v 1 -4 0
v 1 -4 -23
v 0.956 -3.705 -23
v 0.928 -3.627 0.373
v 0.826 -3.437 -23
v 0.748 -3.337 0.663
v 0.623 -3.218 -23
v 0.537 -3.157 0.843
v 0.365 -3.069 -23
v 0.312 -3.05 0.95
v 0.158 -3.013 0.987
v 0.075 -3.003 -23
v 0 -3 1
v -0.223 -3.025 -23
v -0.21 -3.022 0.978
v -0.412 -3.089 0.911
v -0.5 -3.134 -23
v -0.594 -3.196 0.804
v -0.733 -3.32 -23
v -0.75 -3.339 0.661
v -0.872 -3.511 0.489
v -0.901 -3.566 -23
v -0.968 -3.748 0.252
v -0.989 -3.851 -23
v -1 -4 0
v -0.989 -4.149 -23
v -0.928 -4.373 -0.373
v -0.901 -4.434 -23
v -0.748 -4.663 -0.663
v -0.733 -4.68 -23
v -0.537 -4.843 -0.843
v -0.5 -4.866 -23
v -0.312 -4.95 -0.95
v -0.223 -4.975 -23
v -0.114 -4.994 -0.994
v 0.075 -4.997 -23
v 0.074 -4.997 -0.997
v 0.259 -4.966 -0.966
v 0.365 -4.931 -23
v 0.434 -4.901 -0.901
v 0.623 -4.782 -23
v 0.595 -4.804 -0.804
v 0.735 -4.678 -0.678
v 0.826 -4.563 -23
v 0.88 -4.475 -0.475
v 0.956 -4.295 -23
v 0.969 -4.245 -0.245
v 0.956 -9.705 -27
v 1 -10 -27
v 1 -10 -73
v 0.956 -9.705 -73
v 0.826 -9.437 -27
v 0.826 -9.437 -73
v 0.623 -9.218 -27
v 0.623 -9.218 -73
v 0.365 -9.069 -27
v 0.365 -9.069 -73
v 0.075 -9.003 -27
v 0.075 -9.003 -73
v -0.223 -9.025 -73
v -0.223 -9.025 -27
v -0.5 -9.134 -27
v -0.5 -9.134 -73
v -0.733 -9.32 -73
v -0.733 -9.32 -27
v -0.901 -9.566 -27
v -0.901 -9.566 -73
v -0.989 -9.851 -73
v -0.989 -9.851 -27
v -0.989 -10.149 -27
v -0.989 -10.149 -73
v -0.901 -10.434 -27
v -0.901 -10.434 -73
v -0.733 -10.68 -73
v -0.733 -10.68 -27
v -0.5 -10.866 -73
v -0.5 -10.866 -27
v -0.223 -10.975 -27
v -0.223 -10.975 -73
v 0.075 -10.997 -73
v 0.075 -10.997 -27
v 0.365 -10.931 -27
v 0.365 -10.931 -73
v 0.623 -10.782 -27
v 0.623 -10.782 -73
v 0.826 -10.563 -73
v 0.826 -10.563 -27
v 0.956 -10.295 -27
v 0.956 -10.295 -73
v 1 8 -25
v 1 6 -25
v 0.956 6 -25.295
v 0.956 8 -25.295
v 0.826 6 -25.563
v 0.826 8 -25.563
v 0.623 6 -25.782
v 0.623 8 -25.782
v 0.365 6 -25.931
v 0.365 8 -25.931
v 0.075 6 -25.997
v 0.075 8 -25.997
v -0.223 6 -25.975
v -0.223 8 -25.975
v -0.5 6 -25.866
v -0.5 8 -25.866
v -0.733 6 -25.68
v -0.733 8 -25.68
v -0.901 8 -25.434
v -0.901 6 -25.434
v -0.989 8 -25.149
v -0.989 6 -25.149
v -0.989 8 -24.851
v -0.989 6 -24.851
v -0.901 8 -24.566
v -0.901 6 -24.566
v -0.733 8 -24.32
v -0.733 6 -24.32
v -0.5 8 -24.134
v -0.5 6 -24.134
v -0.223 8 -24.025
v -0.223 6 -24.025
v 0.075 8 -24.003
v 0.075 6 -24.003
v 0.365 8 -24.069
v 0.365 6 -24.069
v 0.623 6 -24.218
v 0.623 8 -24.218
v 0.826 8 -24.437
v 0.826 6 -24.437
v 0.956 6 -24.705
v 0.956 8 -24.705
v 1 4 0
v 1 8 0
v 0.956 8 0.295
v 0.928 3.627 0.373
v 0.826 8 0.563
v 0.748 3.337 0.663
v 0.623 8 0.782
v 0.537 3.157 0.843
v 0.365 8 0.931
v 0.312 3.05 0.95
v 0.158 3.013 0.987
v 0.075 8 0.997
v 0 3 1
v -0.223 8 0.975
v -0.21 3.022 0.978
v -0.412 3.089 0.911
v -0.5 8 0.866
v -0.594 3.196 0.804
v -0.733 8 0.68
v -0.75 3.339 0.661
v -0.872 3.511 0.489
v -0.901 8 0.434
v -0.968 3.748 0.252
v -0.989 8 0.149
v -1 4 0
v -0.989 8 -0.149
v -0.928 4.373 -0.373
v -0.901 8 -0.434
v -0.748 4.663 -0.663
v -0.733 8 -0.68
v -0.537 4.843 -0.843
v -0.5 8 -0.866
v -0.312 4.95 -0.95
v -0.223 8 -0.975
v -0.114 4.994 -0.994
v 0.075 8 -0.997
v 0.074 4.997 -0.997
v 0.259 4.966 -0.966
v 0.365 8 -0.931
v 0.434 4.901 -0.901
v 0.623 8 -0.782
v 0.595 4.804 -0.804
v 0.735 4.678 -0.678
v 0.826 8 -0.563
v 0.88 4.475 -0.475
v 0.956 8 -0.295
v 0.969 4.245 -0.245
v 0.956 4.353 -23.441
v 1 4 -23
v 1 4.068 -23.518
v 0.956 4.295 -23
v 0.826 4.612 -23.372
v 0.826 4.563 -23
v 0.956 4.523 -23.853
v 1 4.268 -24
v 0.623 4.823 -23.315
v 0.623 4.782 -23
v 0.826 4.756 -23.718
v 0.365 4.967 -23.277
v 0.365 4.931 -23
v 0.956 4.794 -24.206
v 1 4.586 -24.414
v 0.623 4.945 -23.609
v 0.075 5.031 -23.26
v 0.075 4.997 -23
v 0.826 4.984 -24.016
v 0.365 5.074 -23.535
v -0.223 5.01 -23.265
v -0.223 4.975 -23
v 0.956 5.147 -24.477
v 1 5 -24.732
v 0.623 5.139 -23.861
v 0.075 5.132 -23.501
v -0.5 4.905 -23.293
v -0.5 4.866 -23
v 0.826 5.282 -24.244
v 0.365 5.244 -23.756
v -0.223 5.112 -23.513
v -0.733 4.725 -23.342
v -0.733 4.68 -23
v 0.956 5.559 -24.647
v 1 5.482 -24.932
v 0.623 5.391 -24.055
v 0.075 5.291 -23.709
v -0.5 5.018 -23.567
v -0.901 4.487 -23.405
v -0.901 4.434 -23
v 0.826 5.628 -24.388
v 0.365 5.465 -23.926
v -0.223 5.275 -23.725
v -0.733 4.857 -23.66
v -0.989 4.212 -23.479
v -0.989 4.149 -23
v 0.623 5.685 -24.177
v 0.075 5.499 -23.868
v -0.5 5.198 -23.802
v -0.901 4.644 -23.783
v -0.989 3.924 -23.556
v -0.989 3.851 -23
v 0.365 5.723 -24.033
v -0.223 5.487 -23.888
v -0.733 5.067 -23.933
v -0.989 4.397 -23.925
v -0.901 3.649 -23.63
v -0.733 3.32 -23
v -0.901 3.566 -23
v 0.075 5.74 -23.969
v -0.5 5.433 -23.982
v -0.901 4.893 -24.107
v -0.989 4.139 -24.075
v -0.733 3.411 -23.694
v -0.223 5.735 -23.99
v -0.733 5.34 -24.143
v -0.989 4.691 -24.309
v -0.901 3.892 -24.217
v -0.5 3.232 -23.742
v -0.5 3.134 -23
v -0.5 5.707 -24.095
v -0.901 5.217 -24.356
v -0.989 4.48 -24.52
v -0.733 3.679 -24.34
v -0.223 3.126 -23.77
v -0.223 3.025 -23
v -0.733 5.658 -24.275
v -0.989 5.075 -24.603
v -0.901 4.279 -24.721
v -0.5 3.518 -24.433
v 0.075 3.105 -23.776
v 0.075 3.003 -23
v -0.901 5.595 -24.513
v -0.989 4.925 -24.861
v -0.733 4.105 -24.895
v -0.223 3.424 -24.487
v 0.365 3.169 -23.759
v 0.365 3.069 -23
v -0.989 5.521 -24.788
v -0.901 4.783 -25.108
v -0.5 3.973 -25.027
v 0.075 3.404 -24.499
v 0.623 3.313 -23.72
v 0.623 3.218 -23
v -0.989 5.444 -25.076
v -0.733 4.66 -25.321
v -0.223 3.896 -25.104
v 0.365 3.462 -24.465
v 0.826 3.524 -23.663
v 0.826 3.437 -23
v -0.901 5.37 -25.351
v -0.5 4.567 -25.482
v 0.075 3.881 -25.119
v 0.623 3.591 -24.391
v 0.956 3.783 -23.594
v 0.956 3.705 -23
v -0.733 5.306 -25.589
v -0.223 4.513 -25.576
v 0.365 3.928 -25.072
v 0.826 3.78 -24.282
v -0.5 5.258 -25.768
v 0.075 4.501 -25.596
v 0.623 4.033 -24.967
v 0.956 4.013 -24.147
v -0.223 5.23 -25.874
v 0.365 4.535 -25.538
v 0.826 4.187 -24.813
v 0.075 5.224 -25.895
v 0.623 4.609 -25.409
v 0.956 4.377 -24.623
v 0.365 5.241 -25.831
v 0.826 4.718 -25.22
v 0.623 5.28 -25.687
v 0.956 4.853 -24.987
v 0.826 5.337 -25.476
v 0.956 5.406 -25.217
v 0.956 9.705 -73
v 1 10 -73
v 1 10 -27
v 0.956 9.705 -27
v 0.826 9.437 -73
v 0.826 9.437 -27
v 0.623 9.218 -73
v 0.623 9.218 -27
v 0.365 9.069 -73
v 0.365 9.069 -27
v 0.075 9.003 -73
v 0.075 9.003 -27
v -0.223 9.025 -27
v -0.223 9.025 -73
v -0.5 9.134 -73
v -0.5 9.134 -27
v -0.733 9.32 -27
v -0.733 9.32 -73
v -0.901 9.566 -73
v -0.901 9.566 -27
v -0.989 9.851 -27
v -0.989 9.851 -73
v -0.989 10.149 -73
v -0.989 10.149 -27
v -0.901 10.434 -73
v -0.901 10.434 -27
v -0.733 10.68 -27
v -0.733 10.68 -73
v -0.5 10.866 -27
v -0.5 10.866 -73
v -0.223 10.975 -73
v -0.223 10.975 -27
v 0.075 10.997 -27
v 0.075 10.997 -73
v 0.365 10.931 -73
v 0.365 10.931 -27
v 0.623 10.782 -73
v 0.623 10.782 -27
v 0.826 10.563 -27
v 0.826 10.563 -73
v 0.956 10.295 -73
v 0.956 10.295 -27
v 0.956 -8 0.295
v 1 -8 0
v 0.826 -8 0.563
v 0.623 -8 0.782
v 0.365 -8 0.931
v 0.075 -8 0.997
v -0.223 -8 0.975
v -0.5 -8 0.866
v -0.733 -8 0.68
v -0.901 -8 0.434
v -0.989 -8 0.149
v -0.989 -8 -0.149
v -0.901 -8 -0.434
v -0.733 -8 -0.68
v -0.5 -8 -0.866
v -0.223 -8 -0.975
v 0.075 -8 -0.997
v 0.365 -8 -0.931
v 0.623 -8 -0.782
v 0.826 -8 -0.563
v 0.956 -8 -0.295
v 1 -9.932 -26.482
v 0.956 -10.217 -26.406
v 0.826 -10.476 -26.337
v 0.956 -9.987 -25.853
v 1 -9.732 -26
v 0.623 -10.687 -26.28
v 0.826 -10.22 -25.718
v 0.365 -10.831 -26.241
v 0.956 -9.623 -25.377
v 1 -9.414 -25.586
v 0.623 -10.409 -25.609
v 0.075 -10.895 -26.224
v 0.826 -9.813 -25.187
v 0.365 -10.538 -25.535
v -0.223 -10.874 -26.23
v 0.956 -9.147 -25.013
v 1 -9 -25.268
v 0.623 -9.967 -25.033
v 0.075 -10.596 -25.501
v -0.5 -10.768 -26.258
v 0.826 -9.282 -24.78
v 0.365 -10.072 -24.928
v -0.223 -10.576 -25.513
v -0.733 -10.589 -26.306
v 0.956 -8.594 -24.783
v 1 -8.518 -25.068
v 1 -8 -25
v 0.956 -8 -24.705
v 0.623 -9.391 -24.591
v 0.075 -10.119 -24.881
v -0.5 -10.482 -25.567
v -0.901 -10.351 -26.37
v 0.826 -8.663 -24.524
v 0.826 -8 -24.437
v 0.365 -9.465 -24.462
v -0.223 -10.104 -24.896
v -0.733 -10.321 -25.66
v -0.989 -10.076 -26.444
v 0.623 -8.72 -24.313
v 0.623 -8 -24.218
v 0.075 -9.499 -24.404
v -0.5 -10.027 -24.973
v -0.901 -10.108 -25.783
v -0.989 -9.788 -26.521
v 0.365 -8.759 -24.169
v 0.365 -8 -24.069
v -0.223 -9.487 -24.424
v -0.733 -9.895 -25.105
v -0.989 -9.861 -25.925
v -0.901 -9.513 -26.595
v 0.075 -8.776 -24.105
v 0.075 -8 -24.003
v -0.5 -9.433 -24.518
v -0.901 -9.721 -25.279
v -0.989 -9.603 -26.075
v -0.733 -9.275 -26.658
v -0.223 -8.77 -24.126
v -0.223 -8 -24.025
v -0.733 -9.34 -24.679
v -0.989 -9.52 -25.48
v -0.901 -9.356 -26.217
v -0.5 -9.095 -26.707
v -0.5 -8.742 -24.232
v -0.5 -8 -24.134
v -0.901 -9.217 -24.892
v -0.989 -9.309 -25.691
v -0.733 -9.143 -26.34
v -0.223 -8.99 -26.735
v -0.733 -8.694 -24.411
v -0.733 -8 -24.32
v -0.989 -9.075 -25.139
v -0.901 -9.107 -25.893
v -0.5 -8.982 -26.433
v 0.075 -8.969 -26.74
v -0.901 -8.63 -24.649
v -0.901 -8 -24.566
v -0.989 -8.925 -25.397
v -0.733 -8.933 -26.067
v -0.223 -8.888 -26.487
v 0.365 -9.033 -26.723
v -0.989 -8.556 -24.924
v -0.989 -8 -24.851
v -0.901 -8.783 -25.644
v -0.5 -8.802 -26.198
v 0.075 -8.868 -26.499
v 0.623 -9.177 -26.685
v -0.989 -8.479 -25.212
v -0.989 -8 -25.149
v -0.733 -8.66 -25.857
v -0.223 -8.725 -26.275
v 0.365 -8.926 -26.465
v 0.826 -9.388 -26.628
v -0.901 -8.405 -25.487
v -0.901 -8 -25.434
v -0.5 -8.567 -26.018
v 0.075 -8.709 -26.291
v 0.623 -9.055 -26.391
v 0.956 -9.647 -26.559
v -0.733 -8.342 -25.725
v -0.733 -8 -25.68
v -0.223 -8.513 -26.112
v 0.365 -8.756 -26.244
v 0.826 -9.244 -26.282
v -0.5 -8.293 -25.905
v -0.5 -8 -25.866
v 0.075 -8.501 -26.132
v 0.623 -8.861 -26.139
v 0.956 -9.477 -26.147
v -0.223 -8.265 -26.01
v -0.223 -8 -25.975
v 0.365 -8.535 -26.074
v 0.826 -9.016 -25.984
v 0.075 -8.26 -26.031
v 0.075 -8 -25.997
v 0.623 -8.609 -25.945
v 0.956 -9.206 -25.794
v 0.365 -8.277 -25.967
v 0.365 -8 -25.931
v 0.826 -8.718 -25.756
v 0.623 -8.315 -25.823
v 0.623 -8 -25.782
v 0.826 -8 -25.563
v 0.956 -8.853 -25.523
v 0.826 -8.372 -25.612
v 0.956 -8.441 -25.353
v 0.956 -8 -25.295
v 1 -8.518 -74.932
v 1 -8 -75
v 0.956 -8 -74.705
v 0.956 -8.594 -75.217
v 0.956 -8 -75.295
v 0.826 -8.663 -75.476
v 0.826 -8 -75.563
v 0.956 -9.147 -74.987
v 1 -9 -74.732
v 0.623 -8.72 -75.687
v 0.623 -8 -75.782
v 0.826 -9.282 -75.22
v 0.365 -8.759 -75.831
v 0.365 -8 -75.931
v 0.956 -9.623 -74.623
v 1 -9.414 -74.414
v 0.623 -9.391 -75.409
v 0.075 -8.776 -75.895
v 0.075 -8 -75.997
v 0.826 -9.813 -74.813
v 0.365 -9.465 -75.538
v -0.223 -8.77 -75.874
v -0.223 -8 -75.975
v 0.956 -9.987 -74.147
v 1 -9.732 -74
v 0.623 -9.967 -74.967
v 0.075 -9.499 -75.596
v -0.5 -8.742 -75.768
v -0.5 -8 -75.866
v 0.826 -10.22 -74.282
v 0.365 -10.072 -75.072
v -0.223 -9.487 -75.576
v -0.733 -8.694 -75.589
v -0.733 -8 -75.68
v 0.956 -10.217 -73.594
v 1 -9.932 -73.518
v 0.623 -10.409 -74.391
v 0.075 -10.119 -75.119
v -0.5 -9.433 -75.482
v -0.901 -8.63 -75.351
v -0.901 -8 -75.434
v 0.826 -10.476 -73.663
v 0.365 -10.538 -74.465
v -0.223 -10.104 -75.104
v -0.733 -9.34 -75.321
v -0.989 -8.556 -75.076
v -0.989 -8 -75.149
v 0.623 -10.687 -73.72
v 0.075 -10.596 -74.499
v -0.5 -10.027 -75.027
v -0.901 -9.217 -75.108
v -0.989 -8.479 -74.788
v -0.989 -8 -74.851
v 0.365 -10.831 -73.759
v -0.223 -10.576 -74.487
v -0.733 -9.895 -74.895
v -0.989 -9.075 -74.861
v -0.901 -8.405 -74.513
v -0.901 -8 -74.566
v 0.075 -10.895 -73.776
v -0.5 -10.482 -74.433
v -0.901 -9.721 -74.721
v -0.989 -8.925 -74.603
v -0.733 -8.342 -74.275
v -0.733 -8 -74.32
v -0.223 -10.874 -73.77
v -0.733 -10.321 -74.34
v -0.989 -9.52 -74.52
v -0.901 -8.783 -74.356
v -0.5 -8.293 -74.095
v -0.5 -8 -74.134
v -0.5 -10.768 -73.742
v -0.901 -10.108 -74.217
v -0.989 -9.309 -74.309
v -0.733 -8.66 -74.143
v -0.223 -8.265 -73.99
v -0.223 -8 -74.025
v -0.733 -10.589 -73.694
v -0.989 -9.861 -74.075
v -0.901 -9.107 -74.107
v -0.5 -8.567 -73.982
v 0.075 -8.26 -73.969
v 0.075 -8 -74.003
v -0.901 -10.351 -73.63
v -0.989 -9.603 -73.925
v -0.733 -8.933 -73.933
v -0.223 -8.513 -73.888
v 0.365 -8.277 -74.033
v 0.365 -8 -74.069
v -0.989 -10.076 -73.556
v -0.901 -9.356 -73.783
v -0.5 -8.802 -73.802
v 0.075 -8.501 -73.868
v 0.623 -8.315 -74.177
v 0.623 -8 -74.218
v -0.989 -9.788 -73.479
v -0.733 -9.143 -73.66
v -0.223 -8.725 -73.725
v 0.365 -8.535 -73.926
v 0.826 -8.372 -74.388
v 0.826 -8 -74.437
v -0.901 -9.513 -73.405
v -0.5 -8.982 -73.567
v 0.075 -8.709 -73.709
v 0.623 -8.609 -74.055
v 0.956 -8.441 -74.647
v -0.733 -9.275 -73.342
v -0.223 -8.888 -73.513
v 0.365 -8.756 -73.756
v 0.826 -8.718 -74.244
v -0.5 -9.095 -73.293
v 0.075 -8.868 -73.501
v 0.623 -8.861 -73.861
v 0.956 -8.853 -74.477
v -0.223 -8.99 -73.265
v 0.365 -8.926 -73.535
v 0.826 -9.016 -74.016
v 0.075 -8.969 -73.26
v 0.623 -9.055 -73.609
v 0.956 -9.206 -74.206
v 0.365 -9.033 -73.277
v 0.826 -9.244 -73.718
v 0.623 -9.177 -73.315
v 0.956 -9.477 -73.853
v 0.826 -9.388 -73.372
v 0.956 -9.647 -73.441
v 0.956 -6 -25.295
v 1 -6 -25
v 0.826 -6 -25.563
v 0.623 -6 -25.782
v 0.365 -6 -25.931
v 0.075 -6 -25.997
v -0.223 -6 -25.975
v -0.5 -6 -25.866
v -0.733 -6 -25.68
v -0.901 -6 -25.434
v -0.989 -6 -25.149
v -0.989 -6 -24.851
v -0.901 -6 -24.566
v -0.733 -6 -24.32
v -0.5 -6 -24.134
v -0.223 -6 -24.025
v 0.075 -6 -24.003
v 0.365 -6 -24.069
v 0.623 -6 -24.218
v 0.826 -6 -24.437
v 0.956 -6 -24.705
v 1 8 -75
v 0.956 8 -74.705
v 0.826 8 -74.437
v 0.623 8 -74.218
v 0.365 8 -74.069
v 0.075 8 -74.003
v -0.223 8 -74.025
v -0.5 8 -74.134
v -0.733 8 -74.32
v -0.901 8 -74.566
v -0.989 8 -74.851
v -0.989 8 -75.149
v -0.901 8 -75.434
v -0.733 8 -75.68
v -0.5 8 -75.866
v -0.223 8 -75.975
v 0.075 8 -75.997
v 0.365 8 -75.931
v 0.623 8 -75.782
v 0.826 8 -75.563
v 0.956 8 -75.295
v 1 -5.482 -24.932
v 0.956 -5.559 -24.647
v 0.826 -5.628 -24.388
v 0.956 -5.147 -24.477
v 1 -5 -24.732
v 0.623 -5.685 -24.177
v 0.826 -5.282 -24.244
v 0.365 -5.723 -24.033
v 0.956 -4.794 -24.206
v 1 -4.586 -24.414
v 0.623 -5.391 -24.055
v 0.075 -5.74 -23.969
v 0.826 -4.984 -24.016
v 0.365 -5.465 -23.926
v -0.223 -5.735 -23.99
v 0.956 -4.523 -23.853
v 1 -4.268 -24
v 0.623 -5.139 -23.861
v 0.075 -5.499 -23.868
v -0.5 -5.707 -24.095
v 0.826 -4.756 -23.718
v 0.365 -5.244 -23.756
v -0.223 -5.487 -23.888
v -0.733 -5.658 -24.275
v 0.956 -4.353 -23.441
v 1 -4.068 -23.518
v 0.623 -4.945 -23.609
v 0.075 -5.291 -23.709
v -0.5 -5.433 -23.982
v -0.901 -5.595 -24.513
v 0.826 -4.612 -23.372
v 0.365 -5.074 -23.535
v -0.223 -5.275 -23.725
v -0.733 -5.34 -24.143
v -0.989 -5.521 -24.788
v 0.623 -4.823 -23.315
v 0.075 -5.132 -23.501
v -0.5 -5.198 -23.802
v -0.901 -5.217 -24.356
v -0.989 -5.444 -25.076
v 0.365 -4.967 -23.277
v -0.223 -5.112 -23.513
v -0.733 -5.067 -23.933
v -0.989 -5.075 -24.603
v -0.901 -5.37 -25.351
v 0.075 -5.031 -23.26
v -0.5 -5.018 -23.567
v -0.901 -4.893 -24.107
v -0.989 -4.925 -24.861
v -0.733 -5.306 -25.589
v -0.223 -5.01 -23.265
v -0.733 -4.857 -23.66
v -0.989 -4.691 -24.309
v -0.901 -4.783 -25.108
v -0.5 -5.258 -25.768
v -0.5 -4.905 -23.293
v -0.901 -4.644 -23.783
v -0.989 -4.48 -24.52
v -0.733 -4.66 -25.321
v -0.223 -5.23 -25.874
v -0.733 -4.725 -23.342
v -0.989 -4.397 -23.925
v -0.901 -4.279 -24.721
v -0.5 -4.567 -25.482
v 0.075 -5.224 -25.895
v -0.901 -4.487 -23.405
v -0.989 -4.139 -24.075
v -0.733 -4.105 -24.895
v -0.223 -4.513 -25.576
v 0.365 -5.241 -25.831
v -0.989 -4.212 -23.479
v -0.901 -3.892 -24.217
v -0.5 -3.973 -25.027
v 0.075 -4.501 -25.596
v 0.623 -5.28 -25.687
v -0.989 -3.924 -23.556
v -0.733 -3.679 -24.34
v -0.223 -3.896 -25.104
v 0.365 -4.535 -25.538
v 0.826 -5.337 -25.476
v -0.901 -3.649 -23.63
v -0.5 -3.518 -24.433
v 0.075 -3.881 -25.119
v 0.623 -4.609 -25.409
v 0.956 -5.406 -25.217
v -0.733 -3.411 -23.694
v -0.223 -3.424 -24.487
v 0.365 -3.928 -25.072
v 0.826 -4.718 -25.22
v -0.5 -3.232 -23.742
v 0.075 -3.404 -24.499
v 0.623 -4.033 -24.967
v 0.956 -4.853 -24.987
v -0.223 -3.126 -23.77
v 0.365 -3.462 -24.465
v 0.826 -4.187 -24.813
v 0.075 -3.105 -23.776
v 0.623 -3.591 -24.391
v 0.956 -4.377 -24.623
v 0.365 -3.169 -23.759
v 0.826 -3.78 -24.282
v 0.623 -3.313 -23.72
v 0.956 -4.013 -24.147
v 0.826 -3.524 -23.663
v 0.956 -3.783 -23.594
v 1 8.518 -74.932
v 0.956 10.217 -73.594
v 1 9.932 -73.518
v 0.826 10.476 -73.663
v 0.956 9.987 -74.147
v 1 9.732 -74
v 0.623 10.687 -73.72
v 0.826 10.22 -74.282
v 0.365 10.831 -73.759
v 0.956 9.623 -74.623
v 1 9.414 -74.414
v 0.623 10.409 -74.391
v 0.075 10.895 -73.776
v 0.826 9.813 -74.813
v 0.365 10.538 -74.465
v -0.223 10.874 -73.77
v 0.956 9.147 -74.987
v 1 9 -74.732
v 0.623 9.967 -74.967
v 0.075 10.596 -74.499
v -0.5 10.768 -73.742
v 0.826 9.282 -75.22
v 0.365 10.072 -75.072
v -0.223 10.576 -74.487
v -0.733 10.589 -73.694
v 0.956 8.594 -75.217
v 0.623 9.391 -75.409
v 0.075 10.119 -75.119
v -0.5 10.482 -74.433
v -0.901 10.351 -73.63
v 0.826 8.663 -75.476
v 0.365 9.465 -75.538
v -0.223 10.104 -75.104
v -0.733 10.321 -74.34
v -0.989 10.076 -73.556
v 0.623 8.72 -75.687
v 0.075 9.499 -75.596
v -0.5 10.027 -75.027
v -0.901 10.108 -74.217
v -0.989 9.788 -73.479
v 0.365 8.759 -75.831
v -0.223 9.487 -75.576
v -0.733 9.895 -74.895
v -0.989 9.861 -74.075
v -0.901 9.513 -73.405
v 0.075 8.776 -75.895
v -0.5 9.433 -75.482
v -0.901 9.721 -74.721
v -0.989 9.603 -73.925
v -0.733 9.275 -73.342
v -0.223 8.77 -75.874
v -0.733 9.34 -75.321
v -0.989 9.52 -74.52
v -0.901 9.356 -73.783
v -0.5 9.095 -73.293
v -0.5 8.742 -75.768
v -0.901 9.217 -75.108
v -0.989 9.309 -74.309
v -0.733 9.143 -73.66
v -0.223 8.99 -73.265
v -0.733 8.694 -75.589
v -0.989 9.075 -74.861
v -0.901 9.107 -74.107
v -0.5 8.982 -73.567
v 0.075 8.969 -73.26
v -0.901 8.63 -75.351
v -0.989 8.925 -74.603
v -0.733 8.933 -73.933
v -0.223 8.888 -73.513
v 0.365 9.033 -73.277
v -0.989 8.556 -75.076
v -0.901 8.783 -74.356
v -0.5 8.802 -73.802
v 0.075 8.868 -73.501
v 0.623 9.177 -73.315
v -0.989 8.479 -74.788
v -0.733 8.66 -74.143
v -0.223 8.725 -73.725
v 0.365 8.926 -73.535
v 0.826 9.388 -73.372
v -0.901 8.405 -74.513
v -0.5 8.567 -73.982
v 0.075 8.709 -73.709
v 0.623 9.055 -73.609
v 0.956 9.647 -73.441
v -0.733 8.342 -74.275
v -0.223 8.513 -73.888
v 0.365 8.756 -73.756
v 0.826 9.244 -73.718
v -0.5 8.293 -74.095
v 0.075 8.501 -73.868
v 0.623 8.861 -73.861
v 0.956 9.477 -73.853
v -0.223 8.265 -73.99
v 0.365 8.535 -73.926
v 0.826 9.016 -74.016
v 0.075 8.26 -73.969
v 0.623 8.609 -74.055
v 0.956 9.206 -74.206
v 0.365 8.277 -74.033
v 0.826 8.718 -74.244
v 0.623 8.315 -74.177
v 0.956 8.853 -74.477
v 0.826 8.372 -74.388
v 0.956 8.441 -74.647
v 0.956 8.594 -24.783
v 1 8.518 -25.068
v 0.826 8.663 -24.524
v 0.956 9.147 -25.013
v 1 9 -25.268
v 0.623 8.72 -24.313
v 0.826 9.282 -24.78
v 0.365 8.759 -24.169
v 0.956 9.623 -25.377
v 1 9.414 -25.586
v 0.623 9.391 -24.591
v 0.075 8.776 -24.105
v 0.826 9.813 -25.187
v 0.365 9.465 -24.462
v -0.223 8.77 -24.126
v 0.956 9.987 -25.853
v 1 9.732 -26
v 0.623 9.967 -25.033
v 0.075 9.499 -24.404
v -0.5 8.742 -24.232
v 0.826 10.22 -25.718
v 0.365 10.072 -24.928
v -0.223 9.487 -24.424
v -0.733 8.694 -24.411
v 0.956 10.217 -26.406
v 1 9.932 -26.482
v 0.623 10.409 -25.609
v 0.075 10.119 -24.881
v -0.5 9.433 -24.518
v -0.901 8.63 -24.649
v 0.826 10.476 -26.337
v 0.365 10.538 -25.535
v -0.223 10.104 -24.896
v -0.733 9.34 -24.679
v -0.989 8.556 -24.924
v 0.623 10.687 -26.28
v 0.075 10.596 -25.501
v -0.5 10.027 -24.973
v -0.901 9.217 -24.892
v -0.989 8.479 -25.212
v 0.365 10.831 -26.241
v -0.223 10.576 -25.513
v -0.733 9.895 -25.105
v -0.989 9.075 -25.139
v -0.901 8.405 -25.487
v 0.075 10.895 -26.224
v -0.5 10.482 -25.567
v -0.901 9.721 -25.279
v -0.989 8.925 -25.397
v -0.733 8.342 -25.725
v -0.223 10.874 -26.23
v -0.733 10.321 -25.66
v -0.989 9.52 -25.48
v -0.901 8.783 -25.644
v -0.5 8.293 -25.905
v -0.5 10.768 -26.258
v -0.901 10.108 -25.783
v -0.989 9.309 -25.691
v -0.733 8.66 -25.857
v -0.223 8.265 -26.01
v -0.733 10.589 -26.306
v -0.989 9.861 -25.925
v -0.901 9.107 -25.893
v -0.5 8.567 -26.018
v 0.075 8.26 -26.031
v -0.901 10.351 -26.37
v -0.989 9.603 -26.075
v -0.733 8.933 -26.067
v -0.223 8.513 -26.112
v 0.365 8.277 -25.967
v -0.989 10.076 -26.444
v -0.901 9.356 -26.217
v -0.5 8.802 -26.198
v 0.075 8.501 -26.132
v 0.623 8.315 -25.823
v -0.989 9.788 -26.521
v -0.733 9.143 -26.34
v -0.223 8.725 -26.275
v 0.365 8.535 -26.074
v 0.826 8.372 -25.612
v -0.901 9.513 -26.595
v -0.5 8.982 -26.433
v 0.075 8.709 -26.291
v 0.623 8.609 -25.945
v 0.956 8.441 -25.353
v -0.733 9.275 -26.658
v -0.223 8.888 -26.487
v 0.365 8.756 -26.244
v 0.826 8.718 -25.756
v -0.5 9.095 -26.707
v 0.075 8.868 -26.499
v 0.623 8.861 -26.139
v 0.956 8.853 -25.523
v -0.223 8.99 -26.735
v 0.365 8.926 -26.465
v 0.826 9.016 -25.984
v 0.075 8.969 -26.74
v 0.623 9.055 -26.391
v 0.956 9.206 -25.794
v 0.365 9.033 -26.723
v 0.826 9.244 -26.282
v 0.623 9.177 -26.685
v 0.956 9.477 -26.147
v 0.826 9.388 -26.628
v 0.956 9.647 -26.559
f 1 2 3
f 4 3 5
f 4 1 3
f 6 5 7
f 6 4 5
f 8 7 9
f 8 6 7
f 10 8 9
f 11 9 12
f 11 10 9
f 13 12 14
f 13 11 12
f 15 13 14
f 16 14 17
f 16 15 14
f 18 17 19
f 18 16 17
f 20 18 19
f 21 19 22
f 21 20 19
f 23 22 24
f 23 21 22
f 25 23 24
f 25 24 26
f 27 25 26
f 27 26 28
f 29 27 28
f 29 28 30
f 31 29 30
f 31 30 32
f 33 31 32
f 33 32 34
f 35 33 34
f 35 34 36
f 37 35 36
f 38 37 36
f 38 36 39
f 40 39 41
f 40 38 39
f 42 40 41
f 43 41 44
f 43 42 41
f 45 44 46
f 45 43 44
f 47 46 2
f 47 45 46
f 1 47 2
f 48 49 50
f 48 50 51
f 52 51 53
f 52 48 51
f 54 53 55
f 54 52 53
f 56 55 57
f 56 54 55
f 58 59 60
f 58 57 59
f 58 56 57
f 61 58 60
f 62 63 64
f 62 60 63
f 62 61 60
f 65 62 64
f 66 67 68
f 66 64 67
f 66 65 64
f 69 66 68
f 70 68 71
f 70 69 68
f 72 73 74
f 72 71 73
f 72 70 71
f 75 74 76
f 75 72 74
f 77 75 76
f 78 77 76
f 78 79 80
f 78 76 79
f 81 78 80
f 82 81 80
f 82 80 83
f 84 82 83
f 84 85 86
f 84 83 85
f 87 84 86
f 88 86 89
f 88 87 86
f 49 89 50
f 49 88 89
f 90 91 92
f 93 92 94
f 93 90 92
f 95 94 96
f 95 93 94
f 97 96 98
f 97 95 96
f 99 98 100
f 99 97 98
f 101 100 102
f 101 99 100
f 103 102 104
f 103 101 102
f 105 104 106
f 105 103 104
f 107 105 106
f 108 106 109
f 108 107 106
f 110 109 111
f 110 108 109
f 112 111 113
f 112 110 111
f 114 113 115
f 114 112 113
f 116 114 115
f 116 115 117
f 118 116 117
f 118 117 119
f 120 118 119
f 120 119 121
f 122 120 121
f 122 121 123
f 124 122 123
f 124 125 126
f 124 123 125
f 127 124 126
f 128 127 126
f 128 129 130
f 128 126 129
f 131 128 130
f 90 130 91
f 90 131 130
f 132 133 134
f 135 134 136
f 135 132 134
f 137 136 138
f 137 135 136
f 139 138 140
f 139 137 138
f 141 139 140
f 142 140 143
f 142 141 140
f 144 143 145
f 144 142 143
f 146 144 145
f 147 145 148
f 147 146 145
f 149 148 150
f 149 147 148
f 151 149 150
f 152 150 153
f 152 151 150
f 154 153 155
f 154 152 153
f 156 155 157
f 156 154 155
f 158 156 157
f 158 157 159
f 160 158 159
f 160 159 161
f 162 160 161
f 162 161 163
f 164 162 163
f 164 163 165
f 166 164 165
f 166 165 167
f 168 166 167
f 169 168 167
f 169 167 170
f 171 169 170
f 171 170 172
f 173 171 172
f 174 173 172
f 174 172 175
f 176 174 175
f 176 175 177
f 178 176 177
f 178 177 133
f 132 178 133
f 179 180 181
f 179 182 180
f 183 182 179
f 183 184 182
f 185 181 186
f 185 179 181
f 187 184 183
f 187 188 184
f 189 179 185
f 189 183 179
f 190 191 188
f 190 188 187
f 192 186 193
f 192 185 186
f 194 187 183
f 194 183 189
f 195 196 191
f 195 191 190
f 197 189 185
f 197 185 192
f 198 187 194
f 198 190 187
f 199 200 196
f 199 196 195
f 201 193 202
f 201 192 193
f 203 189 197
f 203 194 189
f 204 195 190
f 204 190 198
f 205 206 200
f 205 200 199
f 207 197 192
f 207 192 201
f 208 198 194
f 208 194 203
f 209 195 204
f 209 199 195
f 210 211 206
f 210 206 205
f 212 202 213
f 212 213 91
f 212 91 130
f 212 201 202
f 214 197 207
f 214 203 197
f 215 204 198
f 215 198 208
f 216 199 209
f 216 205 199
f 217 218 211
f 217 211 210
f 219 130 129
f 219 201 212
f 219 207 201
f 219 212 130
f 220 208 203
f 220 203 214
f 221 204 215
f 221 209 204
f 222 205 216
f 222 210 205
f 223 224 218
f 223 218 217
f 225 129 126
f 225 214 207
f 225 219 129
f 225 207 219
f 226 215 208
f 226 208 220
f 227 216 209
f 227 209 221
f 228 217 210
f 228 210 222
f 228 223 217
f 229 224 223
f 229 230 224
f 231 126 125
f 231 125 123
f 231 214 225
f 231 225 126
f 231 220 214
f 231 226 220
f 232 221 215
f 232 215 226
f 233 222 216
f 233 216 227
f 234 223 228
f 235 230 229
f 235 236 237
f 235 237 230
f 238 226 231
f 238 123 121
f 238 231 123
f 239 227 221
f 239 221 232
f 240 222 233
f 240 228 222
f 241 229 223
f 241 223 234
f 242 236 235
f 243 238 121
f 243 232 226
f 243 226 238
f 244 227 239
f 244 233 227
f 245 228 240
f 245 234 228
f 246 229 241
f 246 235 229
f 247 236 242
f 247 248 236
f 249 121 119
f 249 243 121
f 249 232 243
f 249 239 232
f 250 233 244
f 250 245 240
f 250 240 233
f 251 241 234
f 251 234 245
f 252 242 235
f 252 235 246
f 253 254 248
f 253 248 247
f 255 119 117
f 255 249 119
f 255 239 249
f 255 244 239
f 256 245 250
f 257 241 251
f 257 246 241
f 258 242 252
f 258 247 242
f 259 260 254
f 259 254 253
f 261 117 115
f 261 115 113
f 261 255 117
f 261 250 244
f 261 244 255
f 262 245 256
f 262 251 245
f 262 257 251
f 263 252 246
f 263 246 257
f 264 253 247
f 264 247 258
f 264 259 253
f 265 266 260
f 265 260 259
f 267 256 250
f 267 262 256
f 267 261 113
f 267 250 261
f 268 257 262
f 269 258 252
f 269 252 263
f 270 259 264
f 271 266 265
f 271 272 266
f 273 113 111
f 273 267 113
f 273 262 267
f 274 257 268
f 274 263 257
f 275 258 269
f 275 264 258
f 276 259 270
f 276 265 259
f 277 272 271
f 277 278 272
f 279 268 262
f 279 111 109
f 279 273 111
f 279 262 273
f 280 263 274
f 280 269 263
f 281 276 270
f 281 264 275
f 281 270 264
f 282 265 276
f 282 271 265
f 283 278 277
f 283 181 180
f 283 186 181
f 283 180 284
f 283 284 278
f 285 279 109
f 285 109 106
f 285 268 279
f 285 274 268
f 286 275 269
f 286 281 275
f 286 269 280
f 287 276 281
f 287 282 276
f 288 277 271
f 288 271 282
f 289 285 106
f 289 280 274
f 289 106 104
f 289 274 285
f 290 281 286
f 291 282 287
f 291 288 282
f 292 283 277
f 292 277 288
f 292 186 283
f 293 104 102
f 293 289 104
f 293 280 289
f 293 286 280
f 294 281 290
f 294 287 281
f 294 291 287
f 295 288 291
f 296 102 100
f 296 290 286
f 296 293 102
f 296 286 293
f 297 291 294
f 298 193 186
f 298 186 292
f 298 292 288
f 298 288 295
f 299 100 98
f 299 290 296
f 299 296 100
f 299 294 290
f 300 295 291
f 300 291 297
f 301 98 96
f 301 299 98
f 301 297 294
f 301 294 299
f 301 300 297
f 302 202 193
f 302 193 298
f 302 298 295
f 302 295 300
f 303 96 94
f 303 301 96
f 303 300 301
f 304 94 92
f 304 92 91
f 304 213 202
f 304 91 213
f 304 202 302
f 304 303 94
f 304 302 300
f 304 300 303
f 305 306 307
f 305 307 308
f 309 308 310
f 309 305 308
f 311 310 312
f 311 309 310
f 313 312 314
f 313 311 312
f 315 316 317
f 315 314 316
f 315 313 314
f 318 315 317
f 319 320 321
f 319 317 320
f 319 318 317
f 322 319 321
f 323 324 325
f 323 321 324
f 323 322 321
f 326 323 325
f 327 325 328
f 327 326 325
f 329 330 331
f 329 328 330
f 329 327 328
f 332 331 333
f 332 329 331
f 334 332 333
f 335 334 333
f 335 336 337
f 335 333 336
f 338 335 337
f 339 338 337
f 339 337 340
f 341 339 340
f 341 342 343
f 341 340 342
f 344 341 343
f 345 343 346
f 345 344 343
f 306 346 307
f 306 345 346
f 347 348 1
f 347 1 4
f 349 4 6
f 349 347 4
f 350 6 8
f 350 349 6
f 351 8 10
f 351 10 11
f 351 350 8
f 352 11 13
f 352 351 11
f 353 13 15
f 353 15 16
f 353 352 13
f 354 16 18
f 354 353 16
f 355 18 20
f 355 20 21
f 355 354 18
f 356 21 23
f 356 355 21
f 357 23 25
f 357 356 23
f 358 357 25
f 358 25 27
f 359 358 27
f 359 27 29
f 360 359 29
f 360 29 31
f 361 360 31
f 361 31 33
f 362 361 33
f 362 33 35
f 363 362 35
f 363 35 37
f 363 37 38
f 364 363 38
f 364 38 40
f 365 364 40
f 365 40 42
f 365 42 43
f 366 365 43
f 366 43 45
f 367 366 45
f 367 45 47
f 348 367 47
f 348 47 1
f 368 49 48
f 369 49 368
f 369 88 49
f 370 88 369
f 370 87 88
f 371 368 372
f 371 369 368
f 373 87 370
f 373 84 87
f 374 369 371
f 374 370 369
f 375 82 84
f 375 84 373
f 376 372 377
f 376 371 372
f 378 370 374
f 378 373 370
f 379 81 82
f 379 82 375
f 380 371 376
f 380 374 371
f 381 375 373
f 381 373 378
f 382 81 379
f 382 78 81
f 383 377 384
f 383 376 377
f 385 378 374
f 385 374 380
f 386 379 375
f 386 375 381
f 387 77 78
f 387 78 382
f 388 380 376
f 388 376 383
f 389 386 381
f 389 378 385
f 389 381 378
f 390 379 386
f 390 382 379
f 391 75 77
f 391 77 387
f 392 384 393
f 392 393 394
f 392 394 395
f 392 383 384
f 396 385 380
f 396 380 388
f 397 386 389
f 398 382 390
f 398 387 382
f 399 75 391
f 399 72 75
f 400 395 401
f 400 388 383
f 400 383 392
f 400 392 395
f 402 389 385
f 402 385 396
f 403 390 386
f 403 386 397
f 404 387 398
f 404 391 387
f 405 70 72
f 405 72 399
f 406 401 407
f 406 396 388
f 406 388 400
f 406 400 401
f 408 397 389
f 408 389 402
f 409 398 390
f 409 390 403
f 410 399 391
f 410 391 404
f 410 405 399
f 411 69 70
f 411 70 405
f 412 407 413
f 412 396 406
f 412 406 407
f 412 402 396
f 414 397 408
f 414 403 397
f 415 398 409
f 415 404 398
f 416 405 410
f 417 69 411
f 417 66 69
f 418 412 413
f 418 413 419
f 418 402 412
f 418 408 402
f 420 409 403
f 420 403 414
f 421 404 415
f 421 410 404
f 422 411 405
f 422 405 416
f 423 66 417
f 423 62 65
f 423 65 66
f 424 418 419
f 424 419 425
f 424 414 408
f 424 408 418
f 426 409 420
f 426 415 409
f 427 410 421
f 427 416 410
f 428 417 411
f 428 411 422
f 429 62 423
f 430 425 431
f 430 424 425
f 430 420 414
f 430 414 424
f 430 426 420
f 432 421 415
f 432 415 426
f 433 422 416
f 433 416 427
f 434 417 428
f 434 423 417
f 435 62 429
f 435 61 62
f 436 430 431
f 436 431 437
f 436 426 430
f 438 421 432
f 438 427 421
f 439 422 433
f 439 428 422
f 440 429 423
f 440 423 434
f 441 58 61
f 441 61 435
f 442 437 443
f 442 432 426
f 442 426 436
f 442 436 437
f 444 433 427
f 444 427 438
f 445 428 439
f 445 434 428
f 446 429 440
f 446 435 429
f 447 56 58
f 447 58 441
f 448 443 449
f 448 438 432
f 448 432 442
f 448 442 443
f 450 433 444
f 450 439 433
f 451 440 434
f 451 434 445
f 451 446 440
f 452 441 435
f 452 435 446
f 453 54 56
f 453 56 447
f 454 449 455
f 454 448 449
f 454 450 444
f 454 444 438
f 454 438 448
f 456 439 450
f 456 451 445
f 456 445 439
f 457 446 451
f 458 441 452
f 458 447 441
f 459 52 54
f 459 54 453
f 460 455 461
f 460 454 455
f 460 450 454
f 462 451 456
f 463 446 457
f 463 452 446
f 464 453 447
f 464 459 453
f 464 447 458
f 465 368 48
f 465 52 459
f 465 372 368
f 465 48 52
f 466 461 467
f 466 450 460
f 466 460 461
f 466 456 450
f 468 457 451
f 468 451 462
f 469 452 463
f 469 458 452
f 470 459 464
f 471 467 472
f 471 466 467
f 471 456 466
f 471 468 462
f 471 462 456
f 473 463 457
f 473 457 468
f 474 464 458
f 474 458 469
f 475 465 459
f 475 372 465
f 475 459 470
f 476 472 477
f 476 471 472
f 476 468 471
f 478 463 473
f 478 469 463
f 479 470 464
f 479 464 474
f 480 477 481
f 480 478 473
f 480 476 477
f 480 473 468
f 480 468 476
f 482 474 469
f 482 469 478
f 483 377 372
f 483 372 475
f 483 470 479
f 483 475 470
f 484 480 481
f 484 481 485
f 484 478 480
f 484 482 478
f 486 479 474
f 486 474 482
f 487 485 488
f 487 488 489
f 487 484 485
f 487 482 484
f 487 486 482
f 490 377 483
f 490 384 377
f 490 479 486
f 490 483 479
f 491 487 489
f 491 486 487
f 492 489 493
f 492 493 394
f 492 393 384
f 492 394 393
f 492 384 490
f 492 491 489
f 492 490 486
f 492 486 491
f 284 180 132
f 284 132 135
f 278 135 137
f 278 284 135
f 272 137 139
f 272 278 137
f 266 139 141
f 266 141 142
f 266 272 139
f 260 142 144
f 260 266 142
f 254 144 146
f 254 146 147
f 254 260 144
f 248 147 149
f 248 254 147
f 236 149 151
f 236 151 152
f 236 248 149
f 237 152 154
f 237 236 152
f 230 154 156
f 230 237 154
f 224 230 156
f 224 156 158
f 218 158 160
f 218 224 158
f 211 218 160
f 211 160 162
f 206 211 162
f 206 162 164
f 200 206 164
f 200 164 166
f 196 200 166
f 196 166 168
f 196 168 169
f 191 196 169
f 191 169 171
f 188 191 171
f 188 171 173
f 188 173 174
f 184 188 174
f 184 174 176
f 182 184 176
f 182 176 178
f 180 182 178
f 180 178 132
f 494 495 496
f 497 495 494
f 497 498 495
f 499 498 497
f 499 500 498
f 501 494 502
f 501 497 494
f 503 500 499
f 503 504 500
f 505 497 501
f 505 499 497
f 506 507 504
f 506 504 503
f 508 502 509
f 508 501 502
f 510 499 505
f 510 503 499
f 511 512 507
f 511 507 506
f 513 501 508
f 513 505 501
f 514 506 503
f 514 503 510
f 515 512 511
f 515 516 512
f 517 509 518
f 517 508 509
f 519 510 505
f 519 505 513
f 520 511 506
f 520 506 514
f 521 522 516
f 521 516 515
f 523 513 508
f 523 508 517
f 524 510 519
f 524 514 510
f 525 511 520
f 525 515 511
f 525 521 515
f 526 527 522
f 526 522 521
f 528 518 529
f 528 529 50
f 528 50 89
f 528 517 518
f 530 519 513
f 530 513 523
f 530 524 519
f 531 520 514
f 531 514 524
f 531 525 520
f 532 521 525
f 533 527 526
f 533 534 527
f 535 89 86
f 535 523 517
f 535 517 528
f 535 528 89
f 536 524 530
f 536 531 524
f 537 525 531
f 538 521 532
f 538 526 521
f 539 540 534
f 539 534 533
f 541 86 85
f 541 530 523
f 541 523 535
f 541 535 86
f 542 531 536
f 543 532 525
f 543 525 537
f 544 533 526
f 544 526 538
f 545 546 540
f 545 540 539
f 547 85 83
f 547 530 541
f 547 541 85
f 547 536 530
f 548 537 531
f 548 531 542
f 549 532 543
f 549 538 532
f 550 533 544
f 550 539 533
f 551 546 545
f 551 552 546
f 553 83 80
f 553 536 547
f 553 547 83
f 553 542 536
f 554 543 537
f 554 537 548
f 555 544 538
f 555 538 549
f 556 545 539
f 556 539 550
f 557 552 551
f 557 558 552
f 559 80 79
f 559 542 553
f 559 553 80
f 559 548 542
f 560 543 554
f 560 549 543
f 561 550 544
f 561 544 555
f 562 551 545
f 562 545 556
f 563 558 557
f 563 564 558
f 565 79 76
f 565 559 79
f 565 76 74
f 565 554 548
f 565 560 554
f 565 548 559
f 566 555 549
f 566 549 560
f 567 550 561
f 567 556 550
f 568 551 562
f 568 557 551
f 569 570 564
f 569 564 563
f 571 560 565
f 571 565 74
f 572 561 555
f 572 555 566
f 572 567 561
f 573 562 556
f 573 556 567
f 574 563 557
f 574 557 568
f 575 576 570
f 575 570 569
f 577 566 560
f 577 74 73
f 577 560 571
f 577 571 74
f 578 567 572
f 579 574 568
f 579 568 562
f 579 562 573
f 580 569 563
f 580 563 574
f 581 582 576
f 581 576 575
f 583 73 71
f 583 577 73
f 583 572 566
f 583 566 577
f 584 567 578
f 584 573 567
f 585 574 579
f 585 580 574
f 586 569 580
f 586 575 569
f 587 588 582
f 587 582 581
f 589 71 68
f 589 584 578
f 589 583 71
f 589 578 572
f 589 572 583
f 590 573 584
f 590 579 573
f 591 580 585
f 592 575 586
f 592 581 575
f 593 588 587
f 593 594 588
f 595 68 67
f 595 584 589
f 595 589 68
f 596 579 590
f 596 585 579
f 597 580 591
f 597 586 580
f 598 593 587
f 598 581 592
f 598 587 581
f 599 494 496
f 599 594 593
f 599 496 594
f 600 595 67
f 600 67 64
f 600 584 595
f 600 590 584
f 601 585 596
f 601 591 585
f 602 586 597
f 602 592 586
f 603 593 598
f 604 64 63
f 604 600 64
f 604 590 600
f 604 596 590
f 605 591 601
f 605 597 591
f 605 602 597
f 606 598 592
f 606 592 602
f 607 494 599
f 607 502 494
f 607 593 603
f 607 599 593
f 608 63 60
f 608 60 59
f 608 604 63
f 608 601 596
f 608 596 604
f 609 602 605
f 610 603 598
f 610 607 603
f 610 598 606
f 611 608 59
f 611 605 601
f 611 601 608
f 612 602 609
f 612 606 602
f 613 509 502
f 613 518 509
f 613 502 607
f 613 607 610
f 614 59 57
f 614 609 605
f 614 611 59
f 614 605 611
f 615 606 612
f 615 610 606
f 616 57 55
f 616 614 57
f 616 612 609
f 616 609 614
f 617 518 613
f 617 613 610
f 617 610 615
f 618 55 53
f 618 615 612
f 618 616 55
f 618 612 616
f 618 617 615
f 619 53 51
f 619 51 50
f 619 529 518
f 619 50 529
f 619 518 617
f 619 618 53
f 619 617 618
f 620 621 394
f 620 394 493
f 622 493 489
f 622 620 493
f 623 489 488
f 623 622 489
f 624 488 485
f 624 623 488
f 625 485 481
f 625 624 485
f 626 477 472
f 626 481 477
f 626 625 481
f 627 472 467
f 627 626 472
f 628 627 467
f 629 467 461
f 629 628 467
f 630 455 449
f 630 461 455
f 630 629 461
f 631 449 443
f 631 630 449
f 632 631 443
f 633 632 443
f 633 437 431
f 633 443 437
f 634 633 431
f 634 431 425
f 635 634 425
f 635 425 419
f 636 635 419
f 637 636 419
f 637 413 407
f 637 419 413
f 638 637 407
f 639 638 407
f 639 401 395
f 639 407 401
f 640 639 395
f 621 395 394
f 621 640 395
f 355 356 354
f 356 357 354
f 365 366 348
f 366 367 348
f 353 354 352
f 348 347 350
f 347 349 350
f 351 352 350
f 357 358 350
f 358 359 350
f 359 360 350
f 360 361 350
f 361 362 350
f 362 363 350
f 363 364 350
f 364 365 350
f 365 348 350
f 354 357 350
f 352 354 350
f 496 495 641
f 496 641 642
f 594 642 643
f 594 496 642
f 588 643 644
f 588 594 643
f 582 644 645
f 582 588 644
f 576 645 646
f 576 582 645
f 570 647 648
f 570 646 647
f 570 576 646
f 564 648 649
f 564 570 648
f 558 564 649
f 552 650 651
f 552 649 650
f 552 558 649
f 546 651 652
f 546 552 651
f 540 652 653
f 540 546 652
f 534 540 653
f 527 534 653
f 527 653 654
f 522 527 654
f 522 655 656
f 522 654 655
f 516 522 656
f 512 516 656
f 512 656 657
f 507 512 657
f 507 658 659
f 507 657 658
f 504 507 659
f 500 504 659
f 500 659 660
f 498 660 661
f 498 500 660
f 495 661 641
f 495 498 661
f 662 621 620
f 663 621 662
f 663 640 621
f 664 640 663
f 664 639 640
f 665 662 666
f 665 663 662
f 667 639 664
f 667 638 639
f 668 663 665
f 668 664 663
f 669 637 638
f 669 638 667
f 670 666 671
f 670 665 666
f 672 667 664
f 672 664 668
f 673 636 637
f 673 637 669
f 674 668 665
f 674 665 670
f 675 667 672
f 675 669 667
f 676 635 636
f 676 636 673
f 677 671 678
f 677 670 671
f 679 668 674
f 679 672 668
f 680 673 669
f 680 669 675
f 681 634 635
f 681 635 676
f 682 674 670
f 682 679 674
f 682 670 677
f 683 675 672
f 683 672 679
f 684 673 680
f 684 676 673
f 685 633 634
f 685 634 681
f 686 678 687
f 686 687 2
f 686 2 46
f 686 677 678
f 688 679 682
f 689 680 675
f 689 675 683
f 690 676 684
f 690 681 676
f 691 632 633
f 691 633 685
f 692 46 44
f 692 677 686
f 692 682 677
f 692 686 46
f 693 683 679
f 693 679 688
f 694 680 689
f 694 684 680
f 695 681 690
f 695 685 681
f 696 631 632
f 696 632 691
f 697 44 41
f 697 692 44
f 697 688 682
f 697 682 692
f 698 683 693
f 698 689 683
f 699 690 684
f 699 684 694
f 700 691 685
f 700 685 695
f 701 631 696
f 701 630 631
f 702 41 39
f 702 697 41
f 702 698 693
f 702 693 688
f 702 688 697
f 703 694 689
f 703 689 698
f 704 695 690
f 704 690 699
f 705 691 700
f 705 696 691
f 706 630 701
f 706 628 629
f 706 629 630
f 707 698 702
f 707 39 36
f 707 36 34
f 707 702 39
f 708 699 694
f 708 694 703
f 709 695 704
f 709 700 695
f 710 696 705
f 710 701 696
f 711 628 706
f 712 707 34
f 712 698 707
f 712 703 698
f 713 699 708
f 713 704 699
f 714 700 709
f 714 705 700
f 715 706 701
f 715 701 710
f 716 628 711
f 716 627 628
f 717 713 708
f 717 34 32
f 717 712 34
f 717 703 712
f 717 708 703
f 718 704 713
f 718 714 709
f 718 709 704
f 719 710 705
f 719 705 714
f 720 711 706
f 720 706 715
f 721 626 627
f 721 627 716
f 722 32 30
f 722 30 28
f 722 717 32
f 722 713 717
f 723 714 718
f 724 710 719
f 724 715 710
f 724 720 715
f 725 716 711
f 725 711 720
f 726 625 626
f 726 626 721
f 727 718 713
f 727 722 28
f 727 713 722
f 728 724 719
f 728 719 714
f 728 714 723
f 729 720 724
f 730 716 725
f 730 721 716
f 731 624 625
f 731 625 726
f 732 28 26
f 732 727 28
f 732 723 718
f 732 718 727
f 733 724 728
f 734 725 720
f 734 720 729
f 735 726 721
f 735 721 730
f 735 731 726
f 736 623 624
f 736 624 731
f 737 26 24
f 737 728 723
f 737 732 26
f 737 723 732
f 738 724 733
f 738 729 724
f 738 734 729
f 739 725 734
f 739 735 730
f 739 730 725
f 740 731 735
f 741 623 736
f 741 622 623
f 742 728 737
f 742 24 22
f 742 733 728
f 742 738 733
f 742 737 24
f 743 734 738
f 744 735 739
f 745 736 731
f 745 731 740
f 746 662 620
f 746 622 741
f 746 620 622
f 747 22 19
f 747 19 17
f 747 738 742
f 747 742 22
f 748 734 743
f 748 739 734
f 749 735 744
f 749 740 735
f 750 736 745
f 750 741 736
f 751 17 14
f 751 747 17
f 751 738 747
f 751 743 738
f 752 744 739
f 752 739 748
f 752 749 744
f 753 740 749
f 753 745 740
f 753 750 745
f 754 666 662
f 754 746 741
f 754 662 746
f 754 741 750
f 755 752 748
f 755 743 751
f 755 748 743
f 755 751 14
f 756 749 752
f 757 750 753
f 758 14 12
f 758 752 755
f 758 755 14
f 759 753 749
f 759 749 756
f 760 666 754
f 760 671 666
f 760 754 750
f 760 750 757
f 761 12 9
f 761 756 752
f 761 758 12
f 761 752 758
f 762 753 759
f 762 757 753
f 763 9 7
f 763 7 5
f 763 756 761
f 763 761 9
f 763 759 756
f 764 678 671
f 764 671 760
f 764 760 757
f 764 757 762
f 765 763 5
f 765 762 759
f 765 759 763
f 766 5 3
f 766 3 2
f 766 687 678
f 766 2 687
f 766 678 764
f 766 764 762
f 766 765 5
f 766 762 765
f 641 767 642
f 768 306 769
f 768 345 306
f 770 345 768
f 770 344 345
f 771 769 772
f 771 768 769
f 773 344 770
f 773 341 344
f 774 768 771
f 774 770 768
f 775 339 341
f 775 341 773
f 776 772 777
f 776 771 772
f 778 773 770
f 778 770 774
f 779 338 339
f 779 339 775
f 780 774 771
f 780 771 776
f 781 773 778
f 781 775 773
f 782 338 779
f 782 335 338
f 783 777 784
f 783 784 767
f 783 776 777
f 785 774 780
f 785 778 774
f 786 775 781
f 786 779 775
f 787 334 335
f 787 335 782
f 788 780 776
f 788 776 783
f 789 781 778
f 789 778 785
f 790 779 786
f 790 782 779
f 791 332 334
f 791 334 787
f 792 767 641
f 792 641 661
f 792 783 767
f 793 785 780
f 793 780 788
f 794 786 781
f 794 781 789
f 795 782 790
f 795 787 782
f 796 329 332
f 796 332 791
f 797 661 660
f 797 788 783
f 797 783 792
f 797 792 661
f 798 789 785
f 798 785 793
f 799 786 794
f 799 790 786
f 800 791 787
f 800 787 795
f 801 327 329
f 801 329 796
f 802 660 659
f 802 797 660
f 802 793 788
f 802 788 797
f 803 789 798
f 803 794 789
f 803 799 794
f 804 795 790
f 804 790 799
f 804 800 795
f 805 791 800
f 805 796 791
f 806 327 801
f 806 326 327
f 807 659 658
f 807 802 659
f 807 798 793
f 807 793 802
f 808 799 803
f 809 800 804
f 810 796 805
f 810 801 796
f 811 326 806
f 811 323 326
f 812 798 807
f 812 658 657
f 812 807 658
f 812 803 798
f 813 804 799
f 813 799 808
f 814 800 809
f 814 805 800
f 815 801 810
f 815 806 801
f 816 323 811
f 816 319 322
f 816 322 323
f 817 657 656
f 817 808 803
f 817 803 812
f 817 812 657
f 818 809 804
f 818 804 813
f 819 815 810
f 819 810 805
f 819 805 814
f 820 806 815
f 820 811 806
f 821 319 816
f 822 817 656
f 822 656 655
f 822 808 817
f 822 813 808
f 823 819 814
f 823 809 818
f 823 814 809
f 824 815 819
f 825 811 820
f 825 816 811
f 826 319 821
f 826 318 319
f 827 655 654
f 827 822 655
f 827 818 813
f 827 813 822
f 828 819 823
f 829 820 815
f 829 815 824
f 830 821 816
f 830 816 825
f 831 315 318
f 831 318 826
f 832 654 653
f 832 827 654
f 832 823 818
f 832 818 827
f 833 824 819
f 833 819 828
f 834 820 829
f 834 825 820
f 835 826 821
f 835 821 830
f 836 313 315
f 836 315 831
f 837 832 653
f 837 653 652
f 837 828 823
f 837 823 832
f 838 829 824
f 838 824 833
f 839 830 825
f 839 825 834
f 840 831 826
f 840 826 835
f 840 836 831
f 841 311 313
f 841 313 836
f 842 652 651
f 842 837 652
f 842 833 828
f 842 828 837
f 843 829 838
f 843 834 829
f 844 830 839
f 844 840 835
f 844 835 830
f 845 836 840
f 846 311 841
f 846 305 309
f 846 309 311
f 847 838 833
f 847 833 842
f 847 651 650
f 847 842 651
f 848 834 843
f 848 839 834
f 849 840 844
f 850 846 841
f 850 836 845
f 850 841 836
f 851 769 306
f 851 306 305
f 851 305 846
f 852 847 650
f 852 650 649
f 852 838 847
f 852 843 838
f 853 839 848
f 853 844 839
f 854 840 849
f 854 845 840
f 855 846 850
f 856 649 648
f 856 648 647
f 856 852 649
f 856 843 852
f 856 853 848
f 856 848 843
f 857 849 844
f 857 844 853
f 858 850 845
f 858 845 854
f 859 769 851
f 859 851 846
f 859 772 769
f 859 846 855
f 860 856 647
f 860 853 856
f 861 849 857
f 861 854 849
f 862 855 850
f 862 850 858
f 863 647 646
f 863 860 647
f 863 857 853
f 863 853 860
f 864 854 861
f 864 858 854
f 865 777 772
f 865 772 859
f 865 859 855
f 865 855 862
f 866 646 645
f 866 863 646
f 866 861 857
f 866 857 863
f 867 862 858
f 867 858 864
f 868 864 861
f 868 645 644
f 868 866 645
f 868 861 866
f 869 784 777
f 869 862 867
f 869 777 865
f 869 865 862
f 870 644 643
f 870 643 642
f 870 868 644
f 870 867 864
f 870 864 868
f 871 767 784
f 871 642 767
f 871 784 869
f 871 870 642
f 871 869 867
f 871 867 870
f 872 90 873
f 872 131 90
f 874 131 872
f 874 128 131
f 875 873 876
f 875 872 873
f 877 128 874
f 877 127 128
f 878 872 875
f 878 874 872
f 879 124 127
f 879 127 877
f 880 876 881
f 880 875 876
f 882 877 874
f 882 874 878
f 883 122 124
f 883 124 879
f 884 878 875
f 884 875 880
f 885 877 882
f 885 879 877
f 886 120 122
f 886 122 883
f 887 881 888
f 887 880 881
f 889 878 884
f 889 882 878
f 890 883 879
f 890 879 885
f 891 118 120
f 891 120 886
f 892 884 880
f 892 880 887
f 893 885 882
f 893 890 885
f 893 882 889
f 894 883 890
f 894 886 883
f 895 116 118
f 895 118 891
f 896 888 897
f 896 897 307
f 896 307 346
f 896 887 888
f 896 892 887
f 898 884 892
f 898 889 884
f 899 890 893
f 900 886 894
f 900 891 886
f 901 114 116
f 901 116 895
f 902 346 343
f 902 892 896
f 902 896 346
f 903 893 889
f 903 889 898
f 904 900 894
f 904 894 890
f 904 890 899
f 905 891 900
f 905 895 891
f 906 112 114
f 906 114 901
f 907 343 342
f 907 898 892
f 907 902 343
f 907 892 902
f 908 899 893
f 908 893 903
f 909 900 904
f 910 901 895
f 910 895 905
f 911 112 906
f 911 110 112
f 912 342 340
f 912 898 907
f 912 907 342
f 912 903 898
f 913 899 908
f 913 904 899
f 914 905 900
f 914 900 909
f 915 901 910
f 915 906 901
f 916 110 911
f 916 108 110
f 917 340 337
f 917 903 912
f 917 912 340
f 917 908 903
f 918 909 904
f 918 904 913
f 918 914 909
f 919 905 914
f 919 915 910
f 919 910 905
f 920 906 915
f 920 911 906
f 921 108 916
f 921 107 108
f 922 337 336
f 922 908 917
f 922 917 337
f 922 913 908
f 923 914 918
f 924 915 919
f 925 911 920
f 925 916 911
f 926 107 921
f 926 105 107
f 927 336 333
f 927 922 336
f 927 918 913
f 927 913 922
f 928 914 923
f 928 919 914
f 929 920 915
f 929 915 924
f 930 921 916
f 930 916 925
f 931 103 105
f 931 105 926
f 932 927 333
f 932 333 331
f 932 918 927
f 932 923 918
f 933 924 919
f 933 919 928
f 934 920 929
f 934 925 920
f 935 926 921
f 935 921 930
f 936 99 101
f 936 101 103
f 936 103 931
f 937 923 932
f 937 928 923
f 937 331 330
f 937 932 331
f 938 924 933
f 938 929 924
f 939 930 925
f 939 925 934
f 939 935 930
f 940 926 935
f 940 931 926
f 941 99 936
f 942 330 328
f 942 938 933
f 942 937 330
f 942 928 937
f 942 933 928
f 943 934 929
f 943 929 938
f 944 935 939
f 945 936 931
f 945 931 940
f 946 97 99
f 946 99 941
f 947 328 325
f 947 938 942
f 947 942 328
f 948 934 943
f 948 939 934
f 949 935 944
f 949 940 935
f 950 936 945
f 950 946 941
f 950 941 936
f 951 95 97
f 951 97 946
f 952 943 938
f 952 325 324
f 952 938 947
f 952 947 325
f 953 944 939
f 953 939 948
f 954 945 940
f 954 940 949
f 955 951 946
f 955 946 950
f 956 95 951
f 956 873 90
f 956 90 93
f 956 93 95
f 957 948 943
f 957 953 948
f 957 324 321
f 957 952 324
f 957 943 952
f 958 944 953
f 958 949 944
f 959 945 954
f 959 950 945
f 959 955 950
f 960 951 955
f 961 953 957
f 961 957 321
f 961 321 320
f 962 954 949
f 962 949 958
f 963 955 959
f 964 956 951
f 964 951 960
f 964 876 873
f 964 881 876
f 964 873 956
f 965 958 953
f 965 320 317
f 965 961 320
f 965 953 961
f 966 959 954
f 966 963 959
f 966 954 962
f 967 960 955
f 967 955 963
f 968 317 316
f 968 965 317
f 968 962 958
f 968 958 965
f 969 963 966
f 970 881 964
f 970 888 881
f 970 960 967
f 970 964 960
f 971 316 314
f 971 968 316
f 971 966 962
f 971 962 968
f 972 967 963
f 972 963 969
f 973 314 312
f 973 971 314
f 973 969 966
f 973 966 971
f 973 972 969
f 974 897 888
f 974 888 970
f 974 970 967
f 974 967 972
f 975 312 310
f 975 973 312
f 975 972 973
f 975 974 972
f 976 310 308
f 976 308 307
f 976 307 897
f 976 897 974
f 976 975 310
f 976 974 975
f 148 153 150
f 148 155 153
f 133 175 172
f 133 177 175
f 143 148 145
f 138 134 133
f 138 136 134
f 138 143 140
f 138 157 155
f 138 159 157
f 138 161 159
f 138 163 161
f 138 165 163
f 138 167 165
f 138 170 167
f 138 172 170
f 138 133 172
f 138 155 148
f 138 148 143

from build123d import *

# Parameters (mm, degrees)
SKIZZE5_R = 1


with BuildPart() as part:
    # Austragung1: sweep along a path in Skizze1
    with BuildLine(Plane(origin=(0, 0, 0), x_dir=(0, 0, -1), z_dir=(1, 0, 0))) as austragung1_path:
        Line((0, 8), (0, 4))
        Line((0, 4), (23, 4))
        ThreePointArc((23, 4), (24.414213562, 4.585786438), (25, 6))
        Line((25, 6), (25, 8))
        ThreePointArc((25, 8), (25.585786438, 9.414213562), (27, 10))
        Line((27, 10), (73, 10))
        ThreePointArc((73, 10), (74.414213562, 9.414213562), (75, 8))
        Line((75, 8), (75, -8))
        ThreePointArc((75, -8), (74.414213562, -9.414213562), (73, -10))
        Line((73, -10), (27, -10))
        ThreePointArc((27, -10), (25.585786438, -9.414213562), (25, -8))
        Line((25, -8), (25, -6))
        ThreePointArc((25, -6), (24.414213562, -4.585786438), (23, -4))
        Line((23, -4), (0, -4))
        Line((0, -4), (0, -8))
    # Skizze5 → Austragung1 (sweep)
    with BuildSketch(Plane(origin=(0, 8, 0), x_dir=(1, 0, 0), z_dir=(0, 1, 0))):
        Circle(SKIZZE5_R)
    sweep(path=austragung1_path.line, transition=Transition.RIGHT)


solid = part.part
